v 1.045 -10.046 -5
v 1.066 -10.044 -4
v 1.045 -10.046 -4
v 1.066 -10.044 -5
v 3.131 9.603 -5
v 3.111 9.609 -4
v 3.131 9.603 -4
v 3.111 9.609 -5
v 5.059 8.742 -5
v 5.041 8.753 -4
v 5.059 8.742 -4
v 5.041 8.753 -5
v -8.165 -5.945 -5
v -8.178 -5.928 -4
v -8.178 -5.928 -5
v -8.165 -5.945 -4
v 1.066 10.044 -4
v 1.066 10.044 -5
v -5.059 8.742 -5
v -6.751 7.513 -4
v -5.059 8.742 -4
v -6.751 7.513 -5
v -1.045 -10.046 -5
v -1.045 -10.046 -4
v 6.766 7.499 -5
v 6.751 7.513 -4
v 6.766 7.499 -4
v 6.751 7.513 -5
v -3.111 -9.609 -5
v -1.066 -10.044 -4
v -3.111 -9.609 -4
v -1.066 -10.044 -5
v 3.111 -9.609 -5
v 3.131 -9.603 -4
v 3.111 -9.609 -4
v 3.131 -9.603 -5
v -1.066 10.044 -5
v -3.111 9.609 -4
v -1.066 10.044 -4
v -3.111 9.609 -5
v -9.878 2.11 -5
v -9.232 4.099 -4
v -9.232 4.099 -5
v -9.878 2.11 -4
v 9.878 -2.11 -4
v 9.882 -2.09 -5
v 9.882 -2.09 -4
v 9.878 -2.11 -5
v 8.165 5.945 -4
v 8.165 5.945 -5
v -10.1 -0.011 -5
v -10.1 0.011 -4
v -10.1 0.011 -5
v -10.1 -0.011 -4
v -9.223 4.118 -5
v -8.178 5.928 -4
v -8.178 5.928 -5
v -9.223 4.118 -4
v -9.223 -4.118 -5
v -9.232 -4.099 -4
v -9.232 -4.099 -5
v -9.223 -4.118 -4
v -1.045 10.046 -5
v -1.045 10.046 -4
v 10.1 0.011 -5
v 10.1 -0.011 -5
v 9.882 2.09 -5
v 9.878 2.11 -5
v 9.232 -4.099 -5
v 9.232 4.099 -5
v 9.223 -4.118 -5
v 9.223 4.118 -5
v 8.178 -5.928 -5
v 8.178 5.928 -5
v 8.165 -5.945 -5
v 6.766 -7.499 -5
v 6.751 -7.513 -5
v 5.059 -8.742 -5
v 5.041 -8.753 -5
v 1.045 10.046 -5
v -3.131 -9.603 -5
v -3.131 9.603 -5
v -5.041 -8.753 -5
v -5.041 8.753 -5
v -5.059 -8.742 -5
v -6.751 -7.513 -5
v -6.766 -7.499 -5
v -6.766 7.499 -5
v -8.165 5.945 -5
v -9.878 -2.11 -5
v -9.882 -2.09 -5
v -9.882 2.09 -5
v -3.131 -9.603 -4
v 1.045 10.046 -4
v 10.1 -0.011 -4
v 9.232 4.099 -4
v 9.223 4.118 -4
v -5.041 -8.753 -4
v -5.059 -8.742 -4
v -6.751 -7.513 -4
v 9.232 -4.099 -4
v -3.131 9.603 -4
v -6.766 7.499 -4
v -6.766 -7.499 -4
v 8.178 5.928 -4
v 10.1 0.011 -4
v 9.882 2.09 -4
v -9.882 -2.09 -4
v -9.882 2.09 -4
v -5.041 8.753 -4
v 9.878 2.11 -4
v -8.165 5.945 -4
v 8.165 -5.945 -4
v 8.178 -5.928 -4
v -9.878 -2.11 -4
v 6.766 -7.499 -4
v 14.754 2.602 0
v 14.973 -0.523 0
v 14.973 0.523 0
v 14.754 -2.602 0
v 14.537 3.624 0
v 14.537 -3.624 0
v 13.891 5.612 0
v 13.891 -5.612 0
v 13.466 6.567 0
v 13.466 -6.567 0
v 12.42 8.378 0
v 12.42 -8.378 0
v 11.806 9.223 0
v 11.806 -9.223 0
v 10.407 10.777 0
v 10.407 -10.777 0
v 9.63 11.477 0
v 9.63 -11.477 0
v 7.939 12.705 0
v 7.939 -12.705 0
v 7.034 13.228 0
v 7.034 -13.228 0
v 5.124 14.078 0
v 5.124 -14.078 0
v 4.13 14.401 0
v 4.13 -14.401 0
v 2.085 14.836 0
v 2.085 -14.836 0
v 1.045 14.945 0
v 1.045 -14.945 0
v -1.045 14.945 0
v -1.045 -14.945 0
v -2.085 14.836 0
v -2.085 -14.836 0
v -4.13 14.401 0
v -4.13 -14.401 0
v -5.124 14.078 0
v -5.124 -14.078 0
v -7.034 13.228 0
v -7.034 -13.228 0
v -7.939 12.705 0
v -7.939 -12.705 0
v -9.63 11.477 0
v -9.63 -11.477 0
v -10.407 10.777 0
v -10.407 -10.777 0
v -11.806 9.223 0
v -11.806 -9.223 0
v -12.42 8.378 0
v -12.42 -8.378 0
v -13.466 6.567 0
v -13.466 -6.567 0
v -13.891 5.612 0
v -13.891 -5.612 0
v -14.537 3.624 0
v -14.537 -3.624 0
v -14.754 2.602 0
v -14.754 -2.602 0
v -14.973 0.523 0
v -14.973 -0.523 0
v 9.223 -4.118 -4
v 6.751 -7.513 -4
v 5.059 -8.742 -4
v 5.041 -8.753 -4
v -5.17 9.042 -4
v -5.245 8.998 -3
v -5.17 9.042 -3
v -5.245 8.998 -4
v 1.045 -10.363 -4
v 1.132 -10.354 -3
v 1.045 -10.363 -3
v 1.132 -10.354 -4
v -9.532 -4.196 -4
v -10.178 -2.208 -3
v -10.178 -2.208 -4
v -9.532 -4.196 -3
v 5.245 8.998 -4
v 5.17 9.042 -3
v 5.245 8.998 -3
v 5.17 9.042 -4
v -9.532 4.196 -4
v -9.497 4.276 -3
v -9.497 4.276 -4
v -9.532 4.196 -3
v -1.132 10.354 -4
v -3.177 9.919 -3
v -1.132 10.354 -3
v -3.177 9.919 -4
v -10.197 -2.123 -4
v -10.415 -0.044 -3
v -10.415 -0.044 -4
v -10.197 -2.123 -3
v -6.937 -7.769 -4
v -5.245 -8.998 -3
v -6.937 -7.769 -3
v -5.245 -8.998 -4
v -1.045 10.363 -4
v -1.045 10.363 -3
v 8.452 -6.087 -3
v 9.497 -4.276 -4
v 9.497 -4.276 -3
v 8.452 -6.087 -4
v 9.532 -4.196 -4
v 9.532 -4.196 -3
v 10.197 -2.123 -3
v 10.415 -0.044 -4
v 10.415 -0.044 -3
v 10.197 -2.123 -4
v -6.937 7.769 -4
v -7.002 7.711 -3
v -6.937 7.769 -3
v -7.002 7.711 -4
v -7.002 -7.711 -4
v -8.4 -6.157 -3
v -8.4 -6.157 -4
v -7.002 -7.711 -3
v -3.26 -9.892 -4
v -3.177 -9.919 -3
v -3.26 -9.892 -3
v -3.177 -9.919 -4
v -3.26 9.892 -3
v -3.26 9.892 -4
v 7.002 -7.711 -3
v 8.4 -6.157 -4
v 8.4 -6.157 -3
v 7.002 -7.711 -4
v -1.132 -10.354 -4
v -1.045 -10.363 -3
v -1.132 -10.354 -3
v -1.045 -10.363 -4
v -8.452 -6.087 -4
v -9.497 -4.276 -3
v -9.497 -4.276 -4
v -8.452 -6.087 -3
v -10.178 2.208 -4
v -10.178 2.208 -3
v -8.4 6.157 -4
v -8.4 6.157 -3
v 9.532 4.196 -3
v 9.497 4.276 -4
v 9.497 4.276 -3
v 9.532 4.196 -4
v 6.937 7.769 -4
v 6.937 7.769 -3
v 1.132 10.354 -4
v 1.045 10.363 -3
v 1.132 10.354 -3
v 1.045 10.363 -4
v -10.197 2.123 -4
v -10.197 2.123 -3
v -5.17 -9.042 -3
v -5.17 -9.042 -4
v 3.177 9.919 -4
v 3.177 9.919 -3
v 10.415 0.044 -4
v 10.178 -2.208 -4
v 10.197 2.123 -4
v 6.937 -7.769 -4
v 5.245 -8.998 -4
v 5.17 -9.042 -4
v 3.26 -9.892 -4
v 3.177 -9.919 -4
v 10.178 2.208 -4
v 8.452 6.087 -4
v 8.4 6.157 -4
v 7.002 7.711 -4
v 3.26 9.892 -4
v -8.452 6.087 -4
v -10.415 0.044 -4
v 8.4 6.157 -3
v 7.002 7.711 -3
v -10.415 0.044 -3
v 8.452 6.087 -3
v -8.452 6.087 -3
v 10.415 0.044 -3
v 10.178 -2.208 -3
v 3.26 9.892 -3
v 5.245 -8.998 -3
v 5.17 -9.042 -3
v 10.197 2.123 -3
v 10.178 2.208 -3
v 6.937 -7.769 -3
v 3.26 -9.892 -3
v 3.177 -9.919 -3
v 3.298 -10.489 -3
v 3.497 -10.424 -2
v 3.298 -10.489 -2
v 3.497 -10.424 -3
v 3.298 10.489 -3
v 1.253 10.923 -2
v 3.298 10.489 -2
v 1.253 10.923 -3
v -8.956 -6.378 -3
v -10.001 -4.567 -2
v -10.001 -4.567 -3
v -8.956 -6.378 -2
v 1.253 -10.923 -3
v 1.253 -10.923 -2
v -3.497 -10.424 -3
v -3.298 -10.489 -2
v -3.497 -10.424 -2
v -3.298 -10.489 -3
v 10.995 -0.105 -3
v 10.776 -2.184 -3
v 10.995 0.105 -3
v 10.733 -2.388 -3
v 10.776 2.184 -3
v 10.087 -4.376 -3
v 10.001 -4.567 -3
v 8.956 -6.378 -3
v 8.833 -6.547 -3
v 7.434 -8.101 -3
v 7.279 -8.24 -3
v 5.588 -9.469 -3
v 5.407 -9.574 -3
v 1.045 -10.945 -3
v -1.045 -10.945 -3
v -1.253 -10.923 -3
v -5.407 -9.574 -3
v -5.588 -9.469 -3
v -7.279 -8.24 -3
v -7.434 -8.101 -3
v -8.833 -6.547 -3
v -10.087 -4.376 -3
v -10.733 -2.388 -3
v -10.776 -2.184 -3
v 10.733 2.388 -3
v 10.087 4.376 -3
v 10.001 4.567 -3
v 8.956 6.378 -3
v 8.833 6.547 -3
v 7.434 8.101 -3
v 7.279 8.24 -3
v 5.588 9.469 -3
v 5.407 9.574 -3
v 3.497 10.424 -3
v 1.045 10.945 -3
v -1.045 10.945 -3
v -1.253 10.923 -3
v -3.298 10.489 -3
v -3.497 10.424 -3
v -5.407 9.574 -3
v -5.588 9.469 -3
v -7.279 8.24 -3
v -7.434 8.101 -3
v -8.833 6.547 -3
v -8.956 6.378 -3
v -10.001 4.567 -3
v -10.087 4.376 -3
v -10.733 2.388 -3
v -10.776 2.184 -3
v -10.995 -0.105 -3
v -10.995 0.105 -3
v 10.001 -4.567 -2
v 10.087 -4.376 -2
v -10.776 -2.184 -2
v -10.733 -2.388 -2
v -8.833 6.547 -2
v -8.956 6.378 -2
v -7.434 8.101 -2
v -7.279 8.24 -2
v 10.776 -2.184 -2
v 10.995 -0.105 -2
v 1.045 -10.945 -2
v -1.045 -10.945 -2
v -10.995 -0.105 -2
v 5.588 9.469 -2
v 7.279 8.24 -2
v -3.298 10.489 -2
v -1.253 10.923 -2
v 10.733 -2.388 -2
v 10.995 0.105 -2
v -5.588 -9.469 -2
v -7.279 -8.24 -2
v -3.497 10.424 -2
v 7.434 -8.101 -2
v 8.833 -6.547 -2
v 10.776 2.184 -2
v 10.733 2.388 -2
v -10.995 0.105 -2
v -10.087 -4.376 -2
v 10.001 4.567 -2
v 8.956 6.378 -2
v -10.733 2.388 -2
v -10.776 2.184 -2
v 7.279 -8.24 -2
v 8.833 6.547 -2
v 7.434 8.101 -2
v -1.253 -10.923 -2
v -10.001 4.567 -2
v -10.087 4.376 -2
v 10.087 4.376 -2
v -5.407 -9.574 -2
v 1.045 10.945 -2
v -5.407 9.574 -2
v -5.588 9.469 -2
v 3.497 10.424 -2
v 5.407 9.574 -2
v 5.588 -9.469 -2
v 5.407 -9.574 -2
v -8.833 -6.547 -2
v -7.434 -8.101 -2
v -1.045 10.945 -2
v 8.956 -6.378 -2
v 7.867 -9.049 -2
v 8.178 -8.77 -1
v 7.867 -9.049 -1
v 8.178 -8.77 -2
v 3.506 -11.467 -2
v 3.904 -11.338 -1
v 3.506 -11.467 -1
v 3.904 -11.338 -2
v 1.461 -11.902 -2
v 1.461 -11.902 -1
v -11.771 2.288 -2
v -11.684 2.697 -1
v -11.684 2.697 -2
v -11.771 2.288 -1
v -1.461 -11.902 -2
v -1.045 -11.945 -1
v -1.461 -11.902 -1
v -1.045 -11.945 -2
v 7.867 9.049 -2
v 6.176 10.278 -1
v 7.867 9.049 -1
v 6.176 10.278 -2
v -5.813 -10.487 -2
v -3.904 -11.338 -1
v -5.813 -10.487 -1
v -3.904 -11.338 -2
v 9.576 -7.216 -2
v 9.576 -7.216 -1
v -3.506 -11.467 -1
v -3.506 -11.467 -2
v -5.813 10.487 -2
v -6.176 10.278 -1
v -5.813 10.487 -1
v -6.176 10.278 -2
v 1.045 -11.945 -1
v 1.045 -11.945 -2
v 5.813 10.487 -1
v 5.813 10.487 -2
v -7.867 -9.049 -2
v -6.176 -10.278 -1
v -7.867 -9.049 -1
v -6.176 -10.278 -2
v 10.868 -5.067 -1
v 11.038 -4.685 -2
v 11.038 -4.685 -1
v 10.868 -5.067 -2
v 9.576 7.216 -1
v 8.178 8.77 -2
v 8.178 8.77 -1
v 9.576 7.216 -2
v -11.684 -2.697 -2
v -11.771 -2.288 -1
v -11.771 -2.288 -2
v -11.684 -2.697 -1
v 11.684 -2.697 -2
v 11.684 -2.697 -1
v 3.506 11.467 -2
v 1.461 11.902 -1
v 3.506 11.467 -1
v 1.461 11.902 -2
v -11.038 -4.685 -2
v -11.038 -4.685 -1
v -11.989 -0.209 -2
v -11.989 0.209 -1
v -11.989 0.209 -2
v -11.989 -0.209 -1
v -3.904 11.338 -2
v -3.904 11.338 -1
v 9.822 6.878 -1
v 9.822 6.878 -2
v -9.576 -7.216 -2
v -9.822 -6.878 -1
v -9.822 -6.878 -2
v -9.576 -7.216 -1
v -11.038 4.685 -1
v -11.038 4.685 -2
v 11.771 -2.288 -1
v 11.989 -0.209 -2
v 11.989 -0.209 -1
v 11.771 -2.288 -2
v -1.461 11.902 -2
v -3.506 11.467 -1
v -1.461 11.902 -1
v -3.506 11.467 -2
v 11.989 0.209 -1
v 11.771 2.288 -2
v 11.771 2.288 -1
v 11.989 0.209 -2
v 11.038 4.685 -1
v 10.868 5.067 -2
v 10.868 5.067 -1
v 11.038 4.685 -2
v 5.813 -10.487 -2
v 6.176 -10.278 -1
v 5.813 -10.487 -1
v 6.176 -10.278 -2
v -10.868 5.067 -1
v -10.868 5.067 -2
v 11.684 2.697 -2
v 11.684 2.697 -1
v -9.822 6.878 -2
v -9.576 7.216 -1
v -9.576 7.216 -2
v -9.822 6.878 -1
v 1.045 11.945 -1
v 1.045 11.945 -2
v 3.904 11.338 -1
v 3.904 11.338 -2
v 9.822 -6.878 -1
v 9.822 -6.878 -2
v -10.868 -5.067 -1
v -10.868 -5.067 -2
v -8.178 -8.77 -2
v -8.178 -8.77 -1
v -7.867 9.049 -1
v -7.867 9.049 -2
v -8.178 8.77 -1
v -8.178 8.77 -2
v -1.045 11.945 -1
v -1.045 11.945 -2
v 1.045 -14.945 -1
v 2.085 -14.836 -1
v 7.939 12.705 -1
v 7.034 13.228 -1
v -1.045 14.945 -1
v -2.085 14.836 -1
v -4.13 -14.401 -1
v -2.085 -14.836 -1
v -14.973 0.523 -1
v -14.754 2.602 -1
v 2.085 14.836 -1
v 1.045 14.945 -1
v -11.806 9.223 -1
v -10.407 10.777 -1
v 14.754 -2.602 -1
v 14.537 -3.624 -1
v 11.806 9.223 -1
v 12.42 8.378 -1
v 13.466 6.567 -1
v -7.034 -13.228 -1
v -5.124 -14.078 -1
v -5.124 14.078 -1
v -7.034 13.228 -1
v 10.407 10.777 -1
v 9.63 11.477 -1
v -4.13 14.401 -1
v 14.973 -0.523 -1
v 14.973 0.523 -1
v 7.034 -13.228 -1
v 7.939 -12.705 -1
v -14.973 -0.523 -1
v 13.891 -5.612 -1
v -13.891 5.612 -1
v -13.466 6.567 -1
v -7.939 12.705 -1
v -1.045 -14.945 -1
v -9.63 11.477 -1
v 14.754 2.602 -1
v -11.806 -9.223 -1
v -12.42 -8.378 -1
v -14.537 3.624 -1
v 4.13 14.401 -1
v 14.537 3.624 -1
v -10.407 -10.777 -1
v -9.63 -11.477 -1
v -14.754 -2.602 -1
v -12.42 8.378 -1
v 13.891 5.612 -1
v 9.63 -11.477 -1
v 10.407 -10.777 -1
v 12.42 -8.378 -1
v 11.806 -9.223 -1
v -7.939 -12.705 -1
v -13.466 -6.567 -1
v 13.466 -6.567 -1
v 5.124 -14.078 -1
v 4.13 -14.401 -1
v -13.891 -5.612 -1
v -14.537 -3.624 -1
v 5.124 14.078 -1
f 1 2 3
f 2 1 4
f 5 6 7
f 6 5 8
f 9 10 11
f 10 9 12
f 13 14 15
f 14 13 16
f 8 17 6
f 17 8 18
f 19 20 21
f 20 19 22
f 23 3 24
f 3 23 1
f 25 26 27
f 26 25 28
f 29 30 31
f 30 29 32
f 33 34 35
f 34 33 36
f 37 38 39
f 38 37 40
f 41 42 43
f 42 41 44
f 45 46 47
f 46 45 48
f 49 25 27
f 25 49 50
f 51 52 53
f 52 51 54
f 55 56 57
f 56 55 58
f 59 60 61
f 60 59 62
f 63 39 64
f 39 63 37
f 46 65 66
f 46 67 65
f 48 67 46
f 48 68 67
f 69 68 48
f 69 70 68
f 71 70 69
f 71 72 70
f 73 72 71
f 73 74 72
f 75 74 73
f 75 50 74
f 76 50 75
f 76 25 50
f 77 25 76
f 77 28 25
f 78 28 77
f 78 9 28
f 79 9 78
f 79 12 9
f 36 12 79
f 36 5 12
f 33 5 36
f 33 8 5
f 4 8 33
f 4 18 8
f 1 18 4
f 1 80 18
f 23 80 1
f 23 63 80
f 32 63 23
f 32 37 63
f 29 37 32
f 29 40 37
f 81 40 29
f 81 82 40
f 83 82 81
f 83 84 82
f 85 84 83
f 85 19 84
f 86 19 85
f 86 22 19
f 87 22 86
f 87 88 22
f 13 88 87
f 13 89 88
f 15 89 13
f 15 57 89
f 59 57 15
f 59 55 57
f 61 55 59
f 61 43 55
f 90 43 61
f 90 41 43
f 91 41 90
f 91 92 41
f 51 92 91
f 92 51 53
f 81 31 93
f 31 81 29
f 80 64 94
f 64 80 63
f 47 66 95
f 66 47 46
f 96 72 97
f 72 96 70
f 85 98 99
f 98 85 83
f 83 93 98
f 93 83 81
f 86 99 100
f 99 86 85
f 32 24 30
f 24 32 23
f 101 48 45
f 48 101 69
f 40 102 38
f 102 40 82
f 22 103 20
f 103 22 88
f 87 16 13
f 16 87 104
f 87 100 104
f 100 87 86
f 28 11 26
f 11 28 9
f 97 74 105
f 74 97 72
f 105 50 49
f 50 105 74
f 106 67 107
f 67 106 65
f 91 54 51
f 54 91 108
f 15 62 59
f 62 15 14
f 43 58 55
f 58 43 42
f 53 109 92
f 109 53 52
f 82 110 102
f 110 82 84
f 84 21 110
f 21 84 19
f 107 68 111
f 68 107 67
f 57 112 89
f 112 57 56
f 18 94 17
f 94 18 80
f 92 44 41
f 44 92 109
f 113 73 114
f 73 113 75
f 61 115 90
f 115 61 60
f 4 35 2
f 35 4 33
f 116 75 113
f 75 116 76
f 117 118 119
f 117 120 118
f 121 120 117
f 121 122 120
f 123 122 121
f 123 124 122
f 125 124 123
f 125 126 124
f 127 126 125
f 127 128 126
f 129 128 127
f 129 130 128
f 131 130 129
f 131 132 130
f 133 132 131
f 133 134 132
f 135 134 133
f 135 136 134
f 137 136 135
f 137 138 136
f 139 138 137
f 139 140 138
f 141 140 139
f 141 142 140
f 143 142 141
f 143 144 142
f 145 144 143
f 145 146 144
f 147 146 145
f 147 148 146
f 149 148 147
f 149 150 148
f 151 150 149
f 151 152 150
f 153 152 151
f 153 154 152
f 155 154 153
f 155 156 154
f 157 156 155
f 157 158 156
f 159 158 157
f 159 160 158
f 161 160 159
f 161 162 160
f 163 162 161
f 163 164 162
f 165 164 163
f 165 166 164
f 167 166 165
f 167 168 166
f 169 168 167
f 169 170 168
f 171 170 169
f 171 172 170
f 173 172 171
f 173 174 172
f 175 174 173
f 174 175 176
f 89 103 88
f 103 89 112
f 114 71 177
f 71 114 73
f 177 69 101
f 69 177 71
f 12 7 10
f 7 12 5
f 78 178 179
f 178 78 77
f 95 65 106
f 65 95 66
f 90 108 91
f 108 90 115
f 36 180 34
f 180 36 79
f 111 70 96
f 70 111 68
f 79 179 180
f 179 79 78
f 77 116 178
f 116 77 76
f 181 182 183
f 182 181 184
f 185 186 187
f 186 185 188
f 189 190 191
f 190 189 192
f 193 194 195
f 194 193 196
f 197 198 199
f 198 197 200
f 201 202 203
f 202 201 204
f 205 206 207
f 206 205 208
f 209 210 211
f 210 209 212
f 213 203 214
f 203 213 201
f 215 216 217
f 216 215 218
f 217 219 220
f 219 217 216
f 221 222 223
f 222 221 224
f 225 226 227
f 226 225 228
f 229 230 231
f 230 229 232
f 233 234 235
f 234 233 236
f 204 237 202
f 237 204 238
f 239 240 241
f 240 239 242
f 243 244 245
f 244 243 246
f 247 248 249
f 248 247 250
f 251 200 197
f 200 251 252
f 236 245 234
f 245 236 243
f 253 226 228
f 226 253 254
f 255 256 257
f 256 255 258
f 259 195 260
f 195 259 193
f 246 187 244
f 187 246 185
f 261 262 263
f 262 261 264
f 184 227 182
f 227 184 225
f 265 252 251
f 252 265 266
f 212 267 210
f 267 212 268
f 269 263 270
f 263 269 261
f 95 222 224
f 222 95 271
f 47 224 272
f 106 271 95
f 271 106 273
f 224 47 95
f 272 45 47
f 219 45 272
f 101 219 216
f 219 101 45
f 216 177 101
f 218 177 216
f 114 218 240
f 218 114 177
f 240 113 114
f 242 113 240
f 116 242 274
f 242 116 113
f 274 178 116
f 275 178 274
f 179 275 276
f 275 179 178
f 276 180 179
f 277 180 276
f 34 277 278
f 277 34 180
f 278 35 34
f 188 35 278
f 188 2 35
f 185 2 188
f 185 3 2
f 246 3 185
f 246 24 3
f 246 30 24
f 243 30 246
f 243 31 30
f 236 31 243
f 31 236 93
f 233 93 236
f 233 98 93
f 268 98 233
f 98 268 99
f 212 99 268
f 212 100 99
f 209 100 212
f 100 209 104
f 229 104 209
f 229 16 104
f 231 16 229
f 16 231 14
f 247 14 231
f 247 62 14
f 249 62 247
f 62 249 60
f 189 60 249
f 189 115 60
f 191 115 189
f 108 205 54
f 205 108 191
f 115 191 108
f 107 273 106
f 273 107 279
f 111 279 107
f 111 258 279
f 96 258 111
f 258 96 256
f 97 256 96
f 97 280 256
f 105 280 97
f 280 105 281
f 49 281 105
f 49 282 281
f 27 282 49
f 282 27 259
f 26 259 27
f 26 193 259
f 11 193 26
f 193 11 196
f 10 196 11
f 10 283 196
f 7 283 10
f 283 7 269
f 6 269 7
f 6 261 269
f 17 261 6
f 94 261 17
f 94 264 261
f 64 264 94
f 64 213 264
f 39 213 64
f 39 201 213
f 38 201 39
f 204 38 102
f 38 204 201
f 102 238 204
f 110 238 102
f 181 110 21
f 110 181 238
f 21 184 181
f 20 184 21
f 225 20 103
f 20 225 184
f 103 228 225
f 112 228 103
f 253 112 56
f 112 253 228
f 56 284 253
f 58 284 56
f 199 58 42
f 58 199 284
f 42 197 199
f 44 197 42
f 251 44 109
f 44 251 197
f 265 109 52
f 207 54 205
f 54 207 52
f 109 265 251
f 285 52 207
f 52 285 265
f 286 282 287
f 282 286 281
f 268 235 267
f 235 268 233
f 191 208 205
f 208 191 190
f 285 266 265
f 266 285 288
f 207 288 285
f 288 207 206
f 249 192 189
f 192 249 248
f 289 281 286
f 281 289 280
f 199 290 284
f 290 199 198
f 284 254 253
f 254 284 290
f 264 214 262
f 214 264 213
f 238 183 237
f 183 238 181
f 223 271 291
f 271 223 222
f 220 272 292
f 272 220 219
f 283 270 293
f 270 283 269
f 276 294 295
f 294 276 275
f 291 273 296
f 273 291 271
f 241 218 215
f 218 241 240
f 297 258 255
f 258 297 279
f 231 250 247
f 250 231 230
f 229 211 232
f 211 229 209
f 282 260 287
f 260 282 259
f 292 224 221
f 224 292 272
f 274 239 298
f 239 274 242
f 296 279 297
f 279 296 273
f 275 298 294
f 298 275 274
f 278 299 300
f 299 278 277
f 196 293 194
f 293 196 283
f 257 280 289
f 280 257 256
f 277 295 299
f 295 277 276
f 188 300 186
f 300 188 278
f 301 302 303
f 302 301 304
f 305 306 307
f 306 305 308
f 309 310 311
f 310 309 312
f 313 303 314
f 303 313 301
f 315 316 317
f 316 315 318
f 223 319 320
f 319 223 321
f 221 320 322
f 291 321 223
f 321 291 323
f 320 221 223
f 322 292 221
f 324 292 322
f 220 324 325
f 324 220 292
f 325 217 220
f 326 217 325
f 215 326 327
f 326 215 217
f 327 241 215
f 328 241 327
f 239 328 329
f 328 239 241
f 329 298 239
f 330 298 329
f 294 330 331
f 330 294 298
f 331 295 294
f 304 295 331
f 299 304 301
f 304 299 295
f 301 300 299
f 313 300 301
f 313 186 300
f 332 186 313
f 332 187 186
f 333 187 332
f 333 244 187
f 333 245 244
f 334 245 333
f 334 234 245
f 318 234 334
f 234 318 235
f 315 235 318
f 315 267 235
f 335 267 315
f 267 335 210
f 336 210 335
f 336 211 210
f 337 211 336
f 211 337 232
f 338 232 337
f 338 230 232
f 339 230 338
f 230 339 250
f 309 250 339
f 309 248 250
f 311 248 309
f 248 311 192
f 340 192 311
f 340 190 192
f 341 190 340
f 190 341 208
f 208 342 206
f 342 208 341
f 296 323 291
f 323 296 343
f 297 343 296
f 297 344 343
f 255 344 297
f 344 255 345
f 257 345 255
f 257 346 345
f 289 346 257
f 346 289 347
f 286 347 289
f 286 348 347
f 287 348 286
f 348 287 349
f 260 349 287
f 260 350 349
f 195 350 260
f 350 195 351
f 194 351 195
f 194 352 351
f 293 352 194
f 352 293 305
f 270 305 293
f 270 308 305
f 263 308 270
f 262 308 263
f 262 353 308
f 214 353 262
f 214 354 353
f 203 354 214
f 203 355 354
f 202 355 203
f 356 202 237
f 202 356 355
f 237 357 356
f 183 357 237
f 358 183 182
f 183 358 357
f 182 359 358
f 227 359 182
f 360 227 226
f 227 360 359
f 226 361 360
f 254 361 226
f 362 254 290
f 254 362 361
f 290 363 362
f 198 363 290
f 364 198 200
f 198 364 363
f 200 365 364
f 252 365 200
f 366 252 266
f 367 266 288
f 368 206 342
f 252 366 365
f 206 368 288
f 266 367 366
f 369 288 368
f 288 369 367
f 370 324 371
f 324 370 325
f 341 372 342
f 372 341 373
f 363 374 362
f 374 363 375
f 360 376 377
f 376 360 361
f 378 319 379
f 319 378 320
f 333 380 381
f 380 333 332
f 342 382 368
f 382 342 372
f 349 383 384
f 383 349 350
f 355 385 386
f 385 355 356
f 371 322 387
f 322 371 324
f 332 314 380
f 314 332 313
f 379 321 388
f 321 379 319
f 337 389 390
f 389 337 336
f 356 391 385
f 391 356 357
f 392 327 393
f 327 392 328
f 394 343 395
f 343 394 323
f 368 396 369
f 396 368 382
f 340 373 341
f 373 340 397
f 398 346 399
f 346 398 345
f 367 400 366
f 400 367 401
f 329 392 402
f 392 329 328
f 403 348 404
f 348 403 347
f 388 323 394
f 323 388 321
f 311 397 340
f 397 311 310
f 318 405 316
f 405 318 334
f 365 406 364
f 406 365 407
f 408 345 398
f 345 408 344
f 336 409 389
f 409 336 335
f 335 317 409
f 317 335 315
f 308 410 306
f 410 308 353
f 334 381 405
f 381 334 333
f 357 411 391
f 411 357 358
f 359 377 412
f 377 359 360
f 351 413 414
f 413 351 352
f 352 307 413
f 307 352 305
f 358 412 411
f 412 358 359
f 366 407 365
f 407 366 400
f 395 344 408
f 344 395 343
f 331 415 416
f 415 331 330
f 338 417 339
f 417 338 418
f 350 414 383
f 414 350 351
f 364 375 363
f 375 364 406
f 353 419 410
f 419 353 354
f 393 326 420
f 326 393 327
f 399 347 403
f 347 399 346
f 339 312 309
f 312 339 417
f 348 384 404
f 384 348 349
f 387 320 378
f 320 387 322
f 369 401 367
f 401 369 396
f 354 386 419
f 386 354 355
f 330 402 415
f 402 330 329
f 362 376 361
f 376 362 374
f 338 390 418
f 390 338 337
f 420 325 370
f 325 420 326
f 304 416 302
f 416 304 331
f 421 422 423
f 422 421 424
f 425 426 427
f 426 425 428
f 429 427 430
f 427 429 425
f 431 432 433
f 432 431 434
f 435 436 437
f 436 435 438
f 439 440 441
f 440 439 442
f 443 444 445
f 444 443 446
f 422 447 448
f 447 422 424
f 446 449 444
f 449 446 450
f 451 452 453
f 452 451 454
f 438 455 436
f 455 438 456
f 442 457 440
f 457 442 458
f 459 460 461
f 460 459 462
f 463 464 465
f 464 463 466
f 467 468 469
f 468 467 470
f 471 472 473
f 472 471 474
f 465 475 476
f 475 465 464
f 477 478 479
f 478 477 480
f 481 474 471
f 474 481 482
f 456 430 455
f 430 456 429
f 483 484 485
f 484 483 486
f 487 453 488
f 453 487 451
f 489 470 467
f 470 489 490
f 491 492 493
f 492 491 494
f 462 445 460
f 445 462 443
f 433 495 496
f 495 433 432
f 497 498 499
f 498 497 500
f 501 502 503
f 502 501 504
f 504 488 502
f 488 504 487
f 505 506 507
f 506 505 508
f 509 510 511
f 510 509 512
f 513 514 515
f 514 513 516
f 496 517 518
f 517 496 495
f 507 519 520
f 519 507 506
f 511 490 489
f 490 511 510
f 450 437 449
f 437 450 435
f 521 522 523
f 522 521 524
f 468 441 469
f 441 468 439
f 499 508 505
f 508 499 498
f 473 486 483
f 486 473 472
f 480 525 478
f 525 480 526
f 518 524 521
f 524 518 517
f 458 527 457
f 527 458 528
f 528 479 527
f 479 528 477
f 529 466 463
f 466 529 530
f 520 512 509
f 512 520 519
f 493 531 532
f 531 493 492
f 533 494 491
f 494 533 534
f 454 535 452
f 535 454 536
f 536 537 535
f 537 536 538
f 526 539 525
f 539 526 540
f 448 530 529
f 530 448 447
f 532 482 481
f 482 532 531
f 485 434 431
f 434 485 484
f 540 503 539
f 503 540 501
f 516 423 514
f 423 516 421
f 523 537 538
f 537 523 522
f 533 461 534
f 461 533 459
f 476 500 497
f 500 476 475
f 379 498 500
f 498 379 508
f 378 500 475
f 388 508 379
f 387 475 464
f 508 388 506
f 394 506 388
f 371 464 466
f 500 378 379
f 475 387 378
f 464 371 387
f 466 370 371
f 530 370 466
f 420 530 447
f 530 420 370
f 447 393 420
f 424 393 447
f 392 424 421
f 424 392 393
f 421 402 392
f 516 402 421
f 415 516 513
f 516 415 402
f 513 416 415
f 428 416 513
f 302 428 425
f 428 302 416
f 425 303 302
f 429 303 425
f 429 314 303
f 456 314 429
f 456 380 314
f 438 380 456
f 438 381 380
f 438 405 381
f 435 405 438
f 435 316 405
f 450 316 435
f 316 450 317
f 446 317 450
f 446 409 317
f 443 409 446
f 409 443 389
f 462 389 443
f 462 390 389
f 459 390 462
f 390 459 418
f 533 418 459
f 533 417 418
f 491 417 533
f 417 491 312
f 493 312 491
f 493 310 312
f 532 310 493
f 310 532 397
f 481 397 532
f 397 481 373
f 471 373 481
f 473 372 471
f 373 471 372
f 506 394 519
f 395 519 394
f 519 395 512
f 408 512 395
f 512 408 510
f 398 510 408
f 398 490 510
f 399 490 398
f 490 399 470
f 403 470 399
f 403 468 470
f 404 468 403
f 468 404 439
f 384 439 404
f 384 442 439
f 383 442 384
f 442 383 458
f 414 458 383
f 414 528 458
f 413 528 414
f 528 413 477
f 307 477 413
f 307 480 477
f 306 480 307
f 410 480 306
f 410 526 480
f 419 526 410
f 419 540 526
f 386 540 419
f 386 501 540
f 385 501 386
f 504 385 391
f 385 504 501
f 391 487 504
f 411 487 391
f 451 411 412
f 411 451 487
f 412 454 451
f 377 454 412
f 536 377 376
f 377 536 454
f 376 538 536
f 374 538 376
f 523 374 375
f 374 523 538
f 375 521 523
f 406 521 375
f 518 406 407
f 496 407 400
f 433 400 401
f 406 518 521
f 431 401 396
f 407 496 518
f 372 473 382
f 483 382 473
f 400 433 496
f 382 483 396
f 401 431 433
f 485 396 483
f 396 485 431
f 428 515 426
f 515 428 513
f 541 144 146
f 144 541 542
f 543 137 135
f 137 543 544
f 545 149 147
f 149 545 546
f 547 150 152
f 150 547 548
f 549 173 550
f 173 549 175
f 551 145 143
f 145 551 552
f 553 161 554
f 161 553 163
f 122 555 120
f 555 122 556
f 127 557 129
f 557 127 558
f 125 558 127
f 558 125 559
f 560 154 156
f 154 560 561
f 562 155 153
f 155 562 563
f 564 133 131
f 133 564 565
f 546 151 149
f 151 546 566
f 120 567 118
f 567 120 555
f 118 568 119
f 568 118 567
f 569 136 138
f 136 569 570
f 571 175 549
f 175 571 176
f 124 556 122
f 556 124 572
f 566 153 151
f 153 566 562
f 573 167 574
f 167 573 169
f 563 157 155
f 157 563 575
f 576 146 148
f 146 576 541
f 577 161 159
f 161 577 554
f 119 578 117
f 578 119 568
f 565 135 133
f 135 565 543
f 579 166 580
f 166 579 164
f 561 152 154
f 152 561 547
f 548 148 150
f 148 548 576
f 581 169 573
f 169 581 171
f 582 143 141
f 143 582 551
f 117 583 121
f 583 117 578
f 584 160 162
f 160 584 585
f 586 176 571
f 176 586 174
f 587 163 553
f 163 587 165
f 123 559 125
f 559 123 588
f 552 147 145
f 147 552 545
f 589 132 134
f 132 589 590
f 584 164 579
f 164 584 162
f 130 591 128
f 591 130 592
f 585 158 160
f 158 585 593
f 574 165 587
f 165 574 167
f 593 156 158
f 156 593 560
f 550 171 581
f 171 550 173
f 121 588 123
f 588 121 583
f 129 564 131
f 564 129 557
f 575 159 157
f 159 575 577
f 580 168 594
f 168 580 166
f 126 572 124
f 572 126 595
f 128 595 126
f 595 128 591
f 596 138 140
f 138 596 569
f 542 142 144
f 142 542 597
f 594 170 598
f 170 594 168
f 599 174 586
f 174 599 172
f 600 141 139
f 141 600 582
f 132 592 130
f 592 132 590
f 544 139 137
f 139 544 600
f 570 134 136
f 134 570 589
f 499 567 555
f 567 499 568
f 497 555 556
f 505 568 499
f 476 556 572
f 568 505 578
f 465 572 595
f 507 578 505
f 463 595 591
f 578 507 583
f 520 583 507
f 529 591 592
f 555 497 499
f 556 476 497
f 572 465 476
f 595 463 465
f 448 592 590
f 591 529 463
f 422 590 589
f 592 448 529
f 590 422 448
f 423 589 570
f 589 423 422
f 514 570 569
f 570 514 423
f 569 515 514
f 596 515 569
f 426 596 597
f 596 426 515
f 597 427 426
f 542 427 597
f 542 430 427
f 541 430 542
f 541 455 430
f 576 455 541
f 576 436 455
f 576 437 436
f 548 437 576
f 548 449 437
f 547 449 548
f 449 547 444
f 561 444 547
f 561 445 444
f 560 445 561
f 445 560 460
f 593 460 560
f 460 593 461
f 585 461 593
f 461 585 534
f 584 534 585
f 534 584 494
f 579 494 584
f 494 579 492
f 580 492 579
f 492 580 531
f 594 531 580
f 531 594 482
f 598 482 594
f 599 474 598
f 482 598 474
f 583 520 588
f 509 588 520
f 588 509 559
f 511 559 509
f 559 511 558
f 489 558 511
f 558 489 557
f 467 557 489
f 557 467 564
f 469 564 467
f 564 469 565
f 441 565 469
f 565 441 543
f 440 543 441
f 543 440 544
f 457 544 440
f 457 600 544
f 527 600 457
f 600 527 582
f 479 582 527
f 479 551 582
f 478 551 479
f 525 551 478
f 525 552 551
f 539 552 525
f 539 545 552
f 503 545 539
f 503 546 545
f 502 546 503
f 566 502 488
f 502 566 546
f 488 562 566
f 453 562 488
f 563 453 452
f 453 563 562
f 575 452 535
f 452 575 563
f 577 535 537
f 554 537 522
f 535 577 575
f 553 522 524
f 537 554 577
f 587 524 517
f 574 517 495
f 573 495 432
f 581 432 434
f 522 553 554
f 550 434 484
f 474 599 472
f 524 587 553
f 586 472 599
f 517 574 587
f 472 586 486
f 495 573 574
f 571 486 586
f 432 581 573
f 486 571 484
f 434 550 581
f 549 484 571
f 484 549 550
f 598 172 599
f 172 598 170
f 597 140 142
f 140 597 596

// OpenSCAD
union() {
    union() {
        translate(v=[0, 0, -5]) {
            linear_extrude(height=5) {
                offset(r=0.10102051443364402) {
                    circle(r=10);
                };
            };
        };
        translate(v=[0, 0, -4]) {
            linear_extrude(height=4) {
                offset(r=0.41742430504416006) {
                    circle(r=10);
                };
            };
        };
        translate(v=[0, 0, -3]) {
            linear_extrude(height=3) {
                offset(r=0.9999999999999998) {
                    circle(r=10);
                };
            };
        };
        translate(v=[0, 0, -2]) {
            linear_extrude(height=2) {
                offset(r=2.000000000000001) {
                    circle(r=10);
                };
            };
        };
        translate(v=[0, 0, -1]) {
            linear_extrude(height=1) {
                offset(r=5) {
                    circle(r=10);
                };
            };
        };
    };
    %translate(v=[0, 0, -5]) {
        cylinder(r=10, h=10, center=true);
    };
};
